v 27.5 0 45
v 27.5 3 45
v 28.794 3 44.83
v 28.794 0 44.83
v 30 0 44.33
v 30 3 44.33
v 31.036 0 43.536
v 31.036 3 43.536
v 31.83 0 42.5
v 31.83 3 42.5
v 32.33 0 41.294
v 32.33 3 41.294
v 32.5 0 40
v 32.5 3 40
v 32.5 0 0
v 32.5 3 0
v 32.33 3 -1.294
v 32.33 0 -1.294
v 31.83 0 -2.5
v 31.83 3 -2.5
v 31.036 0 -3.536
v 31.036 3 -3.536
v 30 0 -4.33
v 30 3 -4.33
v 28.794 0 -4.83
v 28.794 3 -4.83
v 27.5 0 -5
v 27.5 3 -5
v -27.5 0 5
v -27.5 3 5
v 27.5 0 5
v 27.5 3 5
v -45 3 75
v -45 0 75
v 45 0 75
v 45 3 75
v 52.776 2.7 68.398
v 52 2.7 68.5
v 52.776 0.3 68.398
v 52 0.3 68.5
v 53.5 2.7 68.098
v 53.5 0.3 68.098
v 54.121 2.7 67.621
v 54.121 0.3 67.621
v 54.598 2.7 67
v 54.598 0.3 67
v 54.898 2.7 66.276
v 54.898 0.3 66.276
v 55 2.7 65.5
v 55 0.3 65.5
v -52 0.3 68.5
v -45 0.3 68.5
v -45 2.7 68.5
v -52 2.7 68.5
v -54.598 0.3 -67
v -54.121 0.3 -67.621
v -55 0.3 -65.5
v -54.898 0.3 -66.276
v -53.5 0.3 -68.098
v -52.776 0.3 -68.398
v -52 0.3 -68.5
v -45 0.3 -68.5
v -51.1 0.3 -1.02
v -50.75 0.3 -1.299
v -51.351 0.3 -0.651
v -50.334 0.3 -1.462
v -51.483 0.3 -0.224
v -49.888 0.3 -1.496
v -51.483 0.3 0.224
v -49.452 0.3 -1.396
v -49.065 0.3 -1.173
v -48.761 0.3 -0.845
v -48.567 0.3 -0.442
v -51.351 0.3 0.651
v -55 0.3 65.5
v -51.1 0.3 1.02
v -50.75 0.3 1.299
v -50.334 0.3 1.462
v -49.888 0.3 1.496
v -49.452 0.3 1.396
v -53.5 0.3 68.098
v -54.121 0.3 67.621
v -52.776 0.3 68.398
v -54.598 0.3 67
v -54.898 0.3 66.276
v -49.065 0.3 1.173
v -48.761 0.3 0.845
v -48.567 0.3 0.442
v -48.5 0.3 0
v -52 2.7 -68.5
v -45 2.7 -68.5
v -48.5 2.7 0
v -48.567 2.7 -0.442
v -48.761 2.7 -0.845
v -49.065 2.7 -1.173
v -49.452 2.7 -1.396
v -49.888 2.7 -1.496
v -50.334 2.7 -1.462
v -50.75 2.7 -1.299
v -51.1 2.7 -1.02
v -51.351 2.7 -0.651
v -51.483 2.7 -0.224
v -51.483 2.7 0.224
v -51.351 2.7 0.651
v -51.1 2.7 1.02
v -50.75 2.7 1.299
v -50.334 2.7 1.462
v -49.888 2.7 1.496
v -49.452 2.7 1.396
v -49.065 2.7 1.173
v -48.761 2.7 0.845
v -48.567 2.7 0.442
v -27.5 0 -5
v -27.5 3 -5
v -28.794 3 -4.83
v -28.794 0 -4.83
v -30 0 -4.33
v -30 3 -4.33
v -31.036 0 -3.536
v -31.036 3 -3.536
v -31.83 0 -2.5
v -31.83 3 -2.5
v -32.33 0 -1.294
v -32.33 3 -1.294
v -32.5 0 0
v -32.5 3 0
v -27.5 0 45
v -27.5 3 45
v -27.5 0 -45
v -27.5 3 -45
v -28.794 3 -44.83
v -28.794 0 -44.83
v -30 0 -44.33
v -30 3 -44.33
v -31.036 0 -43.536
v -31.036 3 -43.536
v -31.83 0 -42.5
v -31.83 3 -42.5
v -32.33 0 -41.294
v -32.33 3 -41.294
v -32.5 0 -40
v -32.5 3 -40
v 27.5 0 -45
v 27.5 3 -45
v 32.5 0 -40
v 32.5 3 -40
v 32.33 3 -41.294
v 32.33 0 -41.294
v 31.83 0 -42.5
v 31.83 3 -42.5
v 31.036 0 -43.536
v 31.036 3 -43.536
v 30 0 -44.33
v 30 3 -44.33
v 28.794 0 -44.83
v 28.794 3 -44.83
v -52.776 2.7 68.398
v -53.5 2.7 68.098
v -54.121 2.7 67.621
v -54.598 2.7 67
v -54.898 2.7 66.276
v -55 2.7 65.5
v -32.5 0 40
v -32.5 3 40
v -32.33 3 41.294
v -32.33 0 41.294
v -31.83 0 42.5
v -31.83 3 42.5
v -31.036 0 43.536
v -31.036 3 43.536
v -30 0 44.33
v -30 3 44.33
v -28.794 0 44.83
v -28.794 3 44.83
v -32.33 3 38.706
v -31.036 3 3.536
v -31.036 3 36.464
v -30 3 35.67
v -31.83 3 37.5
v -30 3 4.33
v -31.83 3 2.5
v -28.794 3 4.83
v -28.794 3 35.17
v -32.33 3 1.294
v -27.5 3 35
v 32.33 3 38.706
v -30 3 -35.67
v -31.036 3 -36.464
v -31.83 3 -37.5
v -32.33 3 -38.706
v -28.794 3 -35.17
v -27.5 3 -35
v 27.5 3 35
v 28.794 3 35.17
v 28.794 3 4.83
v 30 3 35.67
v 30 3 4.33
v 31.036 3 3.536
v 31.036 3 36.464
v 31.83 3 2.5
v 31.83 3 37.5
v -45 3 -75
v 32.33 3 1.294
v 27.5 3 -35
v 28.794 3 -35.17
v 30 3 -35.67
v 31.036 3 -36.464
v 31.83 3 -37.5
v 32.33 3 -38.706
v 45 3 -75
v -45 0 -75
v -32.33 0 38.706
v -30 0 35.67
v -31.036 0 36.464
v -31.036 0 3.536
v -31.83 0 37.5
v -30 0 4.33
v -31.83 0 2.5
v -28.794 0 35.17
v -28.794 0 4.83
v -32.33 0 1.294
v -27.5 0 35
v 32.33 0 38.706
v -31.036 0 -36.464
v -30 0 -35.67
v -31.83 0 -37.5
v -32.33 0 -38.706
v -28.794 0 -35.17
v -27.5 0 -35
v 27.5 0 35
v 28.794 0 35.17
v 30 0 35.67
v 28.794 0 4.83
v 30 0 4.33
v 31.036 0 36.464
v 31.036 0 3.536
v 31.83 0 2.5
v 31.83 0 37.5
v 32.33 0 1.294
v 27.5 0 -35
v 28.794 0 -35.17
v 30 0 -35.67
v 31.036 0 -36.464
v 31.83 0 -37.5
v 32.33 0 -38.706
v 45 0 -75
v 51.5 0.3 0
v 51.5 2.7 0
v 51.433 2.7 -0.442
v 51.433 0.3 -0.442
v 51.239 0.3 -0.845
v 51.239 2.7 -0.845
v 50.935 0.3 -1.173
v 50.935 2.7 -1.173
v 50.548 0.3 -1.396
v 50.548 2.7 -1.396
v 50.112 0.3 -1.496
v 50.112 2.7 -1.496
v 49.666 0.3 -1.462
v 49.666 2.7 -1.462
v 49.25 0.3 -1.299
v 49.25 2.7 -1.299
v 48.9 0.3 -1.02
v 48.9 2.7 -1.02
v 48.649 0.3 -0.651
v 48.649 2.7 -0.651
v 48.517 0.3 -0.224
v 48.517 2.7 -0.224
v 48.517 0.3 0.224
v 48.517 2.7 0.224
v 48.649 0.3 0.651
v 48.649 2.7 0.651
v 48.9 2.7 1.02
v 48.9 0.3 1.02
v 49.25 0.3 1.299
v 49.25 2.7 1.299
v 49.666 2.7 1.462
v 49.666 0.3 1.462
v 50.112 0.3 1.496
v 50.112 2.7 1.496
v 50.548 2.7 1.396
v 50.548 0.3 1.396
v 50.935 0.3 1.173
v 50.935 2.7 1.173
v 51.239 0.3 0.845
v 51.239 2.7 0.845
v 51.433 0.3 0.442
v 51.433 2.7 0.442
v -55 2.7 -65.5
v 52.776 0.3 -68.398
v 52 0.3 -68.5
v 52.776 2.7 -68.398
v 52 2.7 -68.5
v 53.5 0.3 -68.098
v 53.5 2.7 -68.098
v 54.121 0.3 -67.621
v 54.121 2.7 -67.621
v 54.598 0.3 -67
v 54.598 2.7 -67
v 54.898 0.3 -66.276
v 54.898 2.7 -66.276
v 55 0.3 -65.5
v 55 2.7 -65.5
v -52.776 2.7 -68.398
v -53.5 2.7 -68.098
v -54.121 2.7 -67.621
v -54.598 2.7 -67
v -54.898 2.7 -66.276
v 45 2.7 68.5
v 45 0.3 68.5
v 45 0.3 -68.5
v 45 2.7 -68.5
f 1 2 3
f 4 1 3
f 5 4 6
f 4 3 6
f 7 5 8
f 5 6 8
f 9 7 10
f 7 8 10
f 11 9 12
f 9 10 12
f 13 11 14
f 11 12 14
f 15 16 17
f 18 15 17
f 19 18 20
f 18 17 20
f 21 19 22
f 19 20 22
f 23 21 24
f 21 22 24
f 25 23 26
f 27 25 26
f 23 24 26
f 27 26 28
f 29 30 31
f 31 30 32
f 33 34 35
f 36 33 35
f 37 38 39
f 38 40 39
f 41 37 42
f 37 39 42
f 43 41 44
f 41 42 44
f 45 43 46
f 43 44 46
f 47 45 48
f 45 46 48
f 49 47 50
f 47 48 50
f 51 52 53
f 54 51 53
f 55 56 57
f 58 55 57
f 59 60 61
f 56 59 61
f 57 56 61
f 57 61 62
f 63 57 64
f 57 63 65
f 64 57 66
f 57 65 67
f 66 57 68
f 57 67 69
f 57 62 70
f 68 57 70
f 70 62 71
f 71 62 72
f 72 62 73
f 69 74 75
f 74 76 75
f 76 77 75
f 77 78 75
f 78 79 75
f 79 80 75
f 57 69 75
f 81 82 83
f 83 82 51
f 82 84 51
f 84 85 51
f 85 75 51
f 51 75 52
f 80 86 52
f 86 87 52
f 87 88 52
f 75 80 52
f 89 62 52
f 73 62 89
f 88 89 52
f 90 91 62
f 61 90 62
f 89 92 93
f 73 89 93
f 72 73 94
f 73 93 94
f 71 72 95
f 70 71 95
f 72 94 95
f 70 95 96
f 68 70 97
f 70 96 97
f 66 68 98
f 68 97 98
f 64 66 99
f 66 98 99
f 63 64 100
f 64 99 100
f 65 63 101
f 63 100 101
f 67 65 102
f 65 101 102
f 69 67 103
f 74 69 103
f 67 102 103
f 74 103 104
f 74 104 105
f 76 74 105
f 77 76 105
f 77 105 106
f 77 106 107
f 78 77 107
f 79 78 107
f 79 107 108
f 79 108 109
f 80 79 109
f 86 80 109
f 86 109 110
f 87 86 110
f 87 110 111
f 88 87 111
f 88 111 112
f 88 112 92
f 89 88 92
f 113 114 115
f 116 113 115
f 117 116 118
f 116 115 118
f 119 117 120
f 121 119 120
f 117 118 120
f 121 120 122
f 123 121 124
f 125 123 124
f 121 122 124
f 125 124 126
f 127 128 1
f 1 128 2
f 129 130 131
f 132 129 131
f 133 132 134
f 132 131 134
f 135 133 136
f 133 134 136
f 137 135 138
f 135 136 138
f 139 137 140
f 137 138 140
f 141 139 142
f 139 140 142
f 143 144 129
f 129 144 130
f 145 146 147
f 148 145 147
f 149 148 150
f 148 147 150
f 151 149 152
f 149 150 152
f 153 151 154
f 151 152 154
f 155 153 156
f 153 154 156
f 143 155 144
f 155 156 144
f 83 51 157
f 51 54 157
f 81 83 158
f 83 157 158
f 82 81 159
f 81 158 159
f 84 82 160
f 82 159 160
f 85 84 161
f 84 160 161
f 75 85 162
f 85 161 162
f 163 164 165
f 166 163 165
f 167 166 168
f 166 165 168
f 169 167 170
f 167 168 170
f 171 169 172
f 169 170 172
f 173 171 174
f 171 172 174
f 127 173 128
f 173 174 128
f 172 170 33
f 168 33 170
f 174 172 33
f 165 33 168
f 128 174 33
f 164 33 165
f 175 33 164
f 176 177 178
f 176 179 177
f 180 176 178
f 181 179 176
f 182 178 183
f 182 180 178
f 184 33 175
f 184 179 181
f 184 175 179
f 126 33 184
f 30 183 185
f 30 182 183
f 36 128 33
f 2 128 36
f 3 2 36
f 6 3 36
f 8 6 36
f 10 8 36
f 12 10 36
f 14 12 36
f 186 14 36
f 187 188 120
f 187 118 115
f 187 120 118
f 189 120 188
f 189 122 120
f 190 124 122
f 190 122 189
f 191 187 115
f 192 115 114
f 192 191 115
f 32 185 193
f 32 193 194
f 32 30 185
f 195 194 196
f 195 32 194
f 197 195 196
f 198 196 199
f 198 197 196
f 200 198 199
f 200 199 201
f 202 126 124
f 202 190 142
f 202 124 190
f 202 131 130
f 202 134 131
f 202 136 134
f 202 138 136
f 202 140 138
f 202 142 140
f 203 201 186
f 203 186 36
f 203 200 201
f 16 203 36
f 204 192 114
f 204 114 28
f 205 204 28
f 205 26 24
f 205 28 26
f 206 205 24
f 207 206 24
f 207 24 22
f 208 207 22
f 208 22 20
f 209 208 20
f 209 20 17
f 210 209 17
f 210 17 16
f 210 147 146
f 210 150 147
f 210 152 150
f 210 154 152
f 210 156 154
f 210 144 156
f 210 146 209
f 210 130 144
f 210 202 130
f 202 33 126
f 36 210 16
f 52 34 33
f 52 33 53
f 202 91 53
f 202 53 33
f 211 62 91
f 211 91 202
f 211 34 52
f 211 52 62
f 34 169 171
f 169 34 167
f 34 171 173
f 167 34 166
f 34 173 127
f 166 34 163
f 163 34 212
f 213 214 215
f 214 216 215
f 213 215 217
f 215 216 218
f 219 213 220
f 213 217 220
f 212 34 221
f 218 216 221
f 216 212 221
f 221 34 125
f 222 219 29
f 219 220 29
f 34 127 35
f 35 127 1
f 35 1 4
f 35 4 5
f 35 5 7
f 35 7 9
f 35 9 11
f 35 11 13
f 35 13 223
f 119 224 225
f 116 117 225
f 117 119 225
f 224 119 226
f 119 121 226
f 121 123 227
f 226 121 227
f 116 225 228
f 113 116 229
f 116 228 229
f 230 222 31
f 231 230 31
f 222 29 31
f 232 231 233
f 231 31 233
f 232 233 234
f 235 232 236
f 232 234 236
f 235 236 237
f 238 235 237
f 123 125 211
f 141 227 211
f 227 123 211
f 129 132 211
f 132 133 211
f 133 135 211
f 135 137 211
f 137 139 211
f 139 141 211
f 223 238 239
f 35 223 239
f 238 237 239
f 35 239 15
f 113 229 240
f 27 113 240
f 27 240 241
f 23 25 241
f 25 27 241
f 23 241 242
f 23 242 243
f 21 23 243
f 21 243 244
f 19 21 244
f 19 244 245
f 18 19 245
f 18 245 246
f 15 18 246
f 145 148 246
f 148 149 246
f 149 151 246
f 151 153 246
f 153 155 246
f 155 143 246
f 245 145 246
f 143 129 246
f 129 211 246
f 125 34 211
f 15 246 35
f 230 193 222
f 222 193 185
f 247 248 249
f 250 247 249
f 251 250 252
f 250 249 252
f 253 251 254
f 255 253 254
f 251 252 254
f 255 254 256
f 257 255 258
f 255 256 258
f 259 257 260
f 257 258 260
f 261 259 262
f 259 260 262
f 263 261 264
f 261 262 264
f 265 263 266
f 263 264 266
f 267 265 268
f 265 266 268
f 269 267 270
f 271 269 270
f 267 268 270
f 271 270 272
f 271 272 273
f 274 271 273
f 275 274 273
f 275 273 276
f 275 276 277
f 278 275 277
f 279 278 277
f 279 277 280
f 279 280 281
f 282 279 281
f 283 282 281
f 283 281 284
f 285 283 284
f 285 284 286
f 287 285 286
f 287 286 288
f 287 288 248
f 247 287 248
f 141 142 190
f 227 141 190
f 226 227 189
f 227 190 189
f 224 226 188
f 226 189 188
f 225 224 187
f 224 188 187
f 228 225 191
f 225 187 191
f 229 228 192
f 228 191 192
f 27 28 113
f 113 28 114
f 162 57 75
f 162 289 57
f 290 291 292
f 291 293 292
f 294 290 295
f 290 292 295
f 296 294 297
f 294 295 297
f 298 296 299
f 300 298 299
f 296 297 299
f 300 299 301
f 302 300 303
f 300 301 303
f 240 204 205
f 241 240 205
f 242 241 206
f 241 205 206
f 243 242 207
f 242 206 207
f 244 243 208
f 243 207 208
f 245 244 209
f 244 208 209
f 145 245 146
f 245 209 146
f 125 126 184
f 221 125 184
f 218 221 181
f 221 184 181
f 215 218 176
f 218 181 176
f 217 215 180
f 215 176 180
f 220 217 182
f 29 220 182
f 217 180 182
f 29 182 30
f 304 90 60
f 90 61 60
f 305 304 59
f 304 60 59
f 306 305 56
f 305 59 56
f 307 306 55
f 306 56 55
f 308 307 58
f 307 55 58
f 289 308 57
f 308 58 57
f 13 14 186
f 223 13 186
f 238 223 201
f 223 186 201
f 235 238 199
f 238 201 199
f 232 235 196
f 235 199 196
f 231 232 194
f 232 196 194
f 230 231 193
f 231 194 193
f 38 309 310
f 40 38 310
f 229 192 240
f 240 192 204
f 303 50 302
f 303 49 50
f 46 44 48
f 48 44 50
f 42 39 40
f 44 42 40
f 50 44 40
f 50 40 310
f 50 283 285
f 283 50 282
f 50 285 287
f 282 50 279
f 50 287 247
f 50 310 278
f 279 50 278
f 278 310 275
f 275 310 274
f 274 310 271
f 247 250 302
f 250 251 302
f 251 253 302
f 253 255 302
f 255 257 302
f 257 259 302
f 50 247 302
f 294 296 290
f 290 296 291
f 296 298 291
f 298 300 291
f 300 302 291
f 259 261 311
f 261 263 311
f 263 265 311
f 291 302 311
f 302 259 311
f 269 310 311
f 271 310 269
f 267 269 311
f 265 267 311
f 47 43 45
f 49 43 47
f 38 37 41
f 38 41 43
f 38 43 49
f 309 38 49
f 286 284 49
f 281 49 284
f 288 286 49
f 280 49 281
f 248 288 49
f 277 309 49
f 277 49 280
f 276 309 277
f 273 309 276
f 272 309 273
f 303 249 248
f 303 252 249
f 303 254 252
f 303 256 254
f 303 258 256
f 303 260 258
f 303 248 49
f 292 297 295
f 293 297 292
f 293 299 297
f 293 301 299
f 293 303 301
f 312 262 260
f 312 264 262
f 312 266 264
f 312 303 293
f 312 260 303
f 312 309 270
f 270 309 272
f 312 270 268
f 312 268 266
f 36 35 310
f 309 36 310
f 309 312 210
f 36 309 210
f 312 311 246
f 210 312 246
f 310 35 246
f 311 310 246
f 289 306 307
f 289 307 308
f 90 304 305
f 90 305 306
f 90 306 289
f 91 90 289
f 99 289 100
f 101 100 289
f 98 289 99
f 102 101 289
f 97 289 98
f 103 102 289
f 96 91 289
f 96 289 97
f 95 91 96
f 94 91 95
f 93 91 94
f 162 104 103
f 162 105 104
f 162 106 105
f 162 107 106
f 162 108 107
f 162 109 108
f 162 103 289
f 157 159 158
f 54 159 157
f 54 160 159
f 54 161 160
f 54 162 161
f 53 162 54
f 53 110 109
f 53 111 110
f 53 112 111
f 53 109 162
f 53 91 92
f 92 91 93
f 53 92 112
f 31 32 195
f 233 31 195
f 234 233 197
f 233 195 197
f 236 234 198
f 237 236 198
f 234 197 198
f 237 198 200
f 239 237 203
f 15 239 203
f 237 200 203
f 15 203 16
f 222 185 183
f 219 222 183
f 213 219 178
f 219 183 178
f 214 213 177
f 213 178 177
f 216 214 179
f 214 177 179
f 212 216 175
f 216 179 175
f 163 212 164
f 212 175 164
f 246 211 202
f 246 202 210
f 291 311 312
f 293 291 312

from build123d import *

# Parameters (mm, degrees)
SKETCH_1_W          = 90
SKETCH_1_H          = 150
EXTRUDE_1_DEPTH     = 3
CUT_EXTRUDE_1_DEPTH = 3
SKETCH_4_W          = 137
SKETCH_4_H          = 1.2
EXTRUDE_2_DEPTH     = 10
SKETCH_5_W          = 137
SKETCH_5_H          = 1.2
EXTRUDE_3_DEPTH     = 10
FILLET_1_R          = 3
SKETCH_6_R          = 1.5
CUT_EXTRUDE_2_DEPTH = 10
SKETCH_7_R          = 1.5
CUT_EXTRUDE_3_DEPTH = 10


with BuildPart() as part:
    # 草图1 → 凸台-拉伸1 (new body)
    with BuildSketch(Plane(origin=(0, 0, 0), x_dir=(1, 0, 0), z_dir=(0, 1, 0))):
        Rectangle(SKETCH_1_W, SKETCH_1_H)
    extrude(amount=EXTRUDE_1_DEPTH)

    # 草图2 → 切除-拉伸1 (cut)
    with BuildSketch(Plane(origin=(0, 3, 0), x_dir=(1, 0, 0), z_dir=(0, 1, 0))):
        with BuildLine():
            Line((-32.5, 40), (0, 40))
            Line((0, 40), (0, 45))
            Line((0, 45), (-27.5, 45))
            ThreePointArc((-27.5, 45), (-31.035533906, 43.535533906), (-32.5, 40))
        make_face()
        with BuildLine():
            Line((0, 45), (0, 40))
            Line((0, 40), (32.5, 40))
            ThreePointArc((32.5, 40), (31.035533906, 43.535533906), (27.5, 45))
            Line((27.5, 45), (0, 45))
        make_face()
        with BuildLine():
            Line((-27.5, 35), (0, 35))
            Line((0, 35), (0, 40))
            Line((0, 40), (-32.5, 40))
            ThreePointArc((-32.5, 40), (-31.035533906, 36.464466094), (-27.5, 35))
        make_face()
        with BuildLine():
            Line((0, 40), (0, 35))
            Line((0, 35), (27.5, 35))
            ThreePointArc((27.5, 35), (31.035533906, 36.464466094), (32.5, 40))
            Line((32.5, 40), (0, 40))
        make_face()
        with BuildLine():
            ThreePointArc((-27.5, 5), (-31.035533906, 3.535533906), (-32.5, 0))
            Line((-32.5, 0), (0, 0))
            Line((0, 0), (0, 5))
            Line((0, 5), (-27.5, 5))
        make_face()
        with BuildLine():
            Line((0, 5), (0, 0))
            Line((0, 0), (32.5, 0))
            ThreePointArc((32.5, 0), (31.035533906, 3.535533906), (27.5, 5))
            Line((27.5, 5), (0, 5))
        make_face()
        with BuildLine():
            Line((32.5, 0), (0, 0))
            Line((0, 0), (0, -5))
            Line((0, -5), (27.5, -5))
            ThreePointArc((27.5, -5), (31.035533906, -3.535533906), (32.5, 0))
        make_face()
        with BuildLine():
            Line((0, 0), (-32.5, 0))
            ThreePointArc((-32.5, 0), (-31.035533906, -3.535533906), (-27.5, -5))
            Line((-27.5, -5), (0, -5))
            Line((0, -5), (0, 0))
        make_face()
        with BuildLine():
            Line((0, -40), (0, -35))
            Line((0, -35), (-27.5, -35))
            ThreePointArc((-27.5, -35), (-31.035533906, -36.464466094), (-32.5, -40))
            Line((-32.5, -40), (0, -40))
        make_face()
        with BuildLine():
            Line((27.5, -35), (0, -35))
            Line((0, -35), (0, -40))
            Line((0, -40), (32.5, -40))
            ThreePointArc((32.5, -40), (31.035533906, -36.464466094), (27.5, -35))
        make_face()
        with BuildLine():
            Line((0, -45), (0, -40))
            Line((0, -40), (-32.5, -40))
            ThreePointArc((-32.5, -40), (-31.035533906, -43.535533906), (-27.5, -45))
            Line((-27.5, -45), (0, -45))
        make_face()
        with BuildLine():
            Line((32.5, -40), (0, -40))
            Line((0, -40), (0, -45))
            Line((0, -45), (27.5, -45))
            ThreePointArc((27.5, -45), (31.035533906, -43.535533906), (32.5, -40))
        make_face()
    extrude(amount=-CUT_EXTRUDE_1_DEPTH, mode=Mode.SUBTRACT)

    # 草图4 → 凸台-拉伸2 (add)
    with BuildSketch(Plane(origin=(45, 0, 0), x_dir=(0, 0, -1), z_dir=(1, 0, 0))):
        with Locations((0, 0.9)):
            Rectangle(SKETCH_4_W, SKETCH_4_H)
        with Locations((0, 2.1)):
            Rectangle(SKETCH_4_W, SKETCH_4_H)
    extrude(amount=EXTRUDE_2_DEPTH)

    # 草图5 → 凸台-拉伸3 (add)
    with BuildSketch(Plane.ZY.offset(45)):
        with Locations((0, 2.1)):
            Rectangle(SKETCH_5_W, SKETCH_5_H)
        with Locations((0, 0.9)):
            Rectangle(SKETCH_5_W, SKETCH_5_H)
    extrude(amount=EXTRUDE_3_DEPTH)

    # 圆角1
    fillet_1_edges = [part.edges().sort_by_distance(p)[0] for p in [
        (55, 1.5, -68.5),
        (55, 1.5, 68.5),
        (-55, 1.5, 68.5),
        (-55, 1.5, -68.5),
    ]]
    fillet(fillet_1_edges, radius=FILLET_1_R)

    # 草图6 → 切除-拉伸2 (cut)
    with BuildSketch(Plane(origin=(0, 2.7, 0), x_dir=(1, 0, 0), z_dir=(0, 1, 0))):
        with Locations((50, 0)):
            Circle(SKETCH_6_R)
    extrude(amount=-CUT_EXTRUDE_2_DEPTH, mode=Mode.SUBTRACT)

    # 草图7 → 切除-拉伸3 (cut)
    with BuildSketch(Plane(origin=(0, 2.7, 0), x_dir=(1, 0, 0), z_dir=(0, 1, 0))):
        with Locations((-50, 0)):
            Circle(SKETCH_7_R)
    extrude(amount=-CUT_EXTRUDE_3_DEPTH, mode=Mode.SUBTRACT)


solid = part.part
